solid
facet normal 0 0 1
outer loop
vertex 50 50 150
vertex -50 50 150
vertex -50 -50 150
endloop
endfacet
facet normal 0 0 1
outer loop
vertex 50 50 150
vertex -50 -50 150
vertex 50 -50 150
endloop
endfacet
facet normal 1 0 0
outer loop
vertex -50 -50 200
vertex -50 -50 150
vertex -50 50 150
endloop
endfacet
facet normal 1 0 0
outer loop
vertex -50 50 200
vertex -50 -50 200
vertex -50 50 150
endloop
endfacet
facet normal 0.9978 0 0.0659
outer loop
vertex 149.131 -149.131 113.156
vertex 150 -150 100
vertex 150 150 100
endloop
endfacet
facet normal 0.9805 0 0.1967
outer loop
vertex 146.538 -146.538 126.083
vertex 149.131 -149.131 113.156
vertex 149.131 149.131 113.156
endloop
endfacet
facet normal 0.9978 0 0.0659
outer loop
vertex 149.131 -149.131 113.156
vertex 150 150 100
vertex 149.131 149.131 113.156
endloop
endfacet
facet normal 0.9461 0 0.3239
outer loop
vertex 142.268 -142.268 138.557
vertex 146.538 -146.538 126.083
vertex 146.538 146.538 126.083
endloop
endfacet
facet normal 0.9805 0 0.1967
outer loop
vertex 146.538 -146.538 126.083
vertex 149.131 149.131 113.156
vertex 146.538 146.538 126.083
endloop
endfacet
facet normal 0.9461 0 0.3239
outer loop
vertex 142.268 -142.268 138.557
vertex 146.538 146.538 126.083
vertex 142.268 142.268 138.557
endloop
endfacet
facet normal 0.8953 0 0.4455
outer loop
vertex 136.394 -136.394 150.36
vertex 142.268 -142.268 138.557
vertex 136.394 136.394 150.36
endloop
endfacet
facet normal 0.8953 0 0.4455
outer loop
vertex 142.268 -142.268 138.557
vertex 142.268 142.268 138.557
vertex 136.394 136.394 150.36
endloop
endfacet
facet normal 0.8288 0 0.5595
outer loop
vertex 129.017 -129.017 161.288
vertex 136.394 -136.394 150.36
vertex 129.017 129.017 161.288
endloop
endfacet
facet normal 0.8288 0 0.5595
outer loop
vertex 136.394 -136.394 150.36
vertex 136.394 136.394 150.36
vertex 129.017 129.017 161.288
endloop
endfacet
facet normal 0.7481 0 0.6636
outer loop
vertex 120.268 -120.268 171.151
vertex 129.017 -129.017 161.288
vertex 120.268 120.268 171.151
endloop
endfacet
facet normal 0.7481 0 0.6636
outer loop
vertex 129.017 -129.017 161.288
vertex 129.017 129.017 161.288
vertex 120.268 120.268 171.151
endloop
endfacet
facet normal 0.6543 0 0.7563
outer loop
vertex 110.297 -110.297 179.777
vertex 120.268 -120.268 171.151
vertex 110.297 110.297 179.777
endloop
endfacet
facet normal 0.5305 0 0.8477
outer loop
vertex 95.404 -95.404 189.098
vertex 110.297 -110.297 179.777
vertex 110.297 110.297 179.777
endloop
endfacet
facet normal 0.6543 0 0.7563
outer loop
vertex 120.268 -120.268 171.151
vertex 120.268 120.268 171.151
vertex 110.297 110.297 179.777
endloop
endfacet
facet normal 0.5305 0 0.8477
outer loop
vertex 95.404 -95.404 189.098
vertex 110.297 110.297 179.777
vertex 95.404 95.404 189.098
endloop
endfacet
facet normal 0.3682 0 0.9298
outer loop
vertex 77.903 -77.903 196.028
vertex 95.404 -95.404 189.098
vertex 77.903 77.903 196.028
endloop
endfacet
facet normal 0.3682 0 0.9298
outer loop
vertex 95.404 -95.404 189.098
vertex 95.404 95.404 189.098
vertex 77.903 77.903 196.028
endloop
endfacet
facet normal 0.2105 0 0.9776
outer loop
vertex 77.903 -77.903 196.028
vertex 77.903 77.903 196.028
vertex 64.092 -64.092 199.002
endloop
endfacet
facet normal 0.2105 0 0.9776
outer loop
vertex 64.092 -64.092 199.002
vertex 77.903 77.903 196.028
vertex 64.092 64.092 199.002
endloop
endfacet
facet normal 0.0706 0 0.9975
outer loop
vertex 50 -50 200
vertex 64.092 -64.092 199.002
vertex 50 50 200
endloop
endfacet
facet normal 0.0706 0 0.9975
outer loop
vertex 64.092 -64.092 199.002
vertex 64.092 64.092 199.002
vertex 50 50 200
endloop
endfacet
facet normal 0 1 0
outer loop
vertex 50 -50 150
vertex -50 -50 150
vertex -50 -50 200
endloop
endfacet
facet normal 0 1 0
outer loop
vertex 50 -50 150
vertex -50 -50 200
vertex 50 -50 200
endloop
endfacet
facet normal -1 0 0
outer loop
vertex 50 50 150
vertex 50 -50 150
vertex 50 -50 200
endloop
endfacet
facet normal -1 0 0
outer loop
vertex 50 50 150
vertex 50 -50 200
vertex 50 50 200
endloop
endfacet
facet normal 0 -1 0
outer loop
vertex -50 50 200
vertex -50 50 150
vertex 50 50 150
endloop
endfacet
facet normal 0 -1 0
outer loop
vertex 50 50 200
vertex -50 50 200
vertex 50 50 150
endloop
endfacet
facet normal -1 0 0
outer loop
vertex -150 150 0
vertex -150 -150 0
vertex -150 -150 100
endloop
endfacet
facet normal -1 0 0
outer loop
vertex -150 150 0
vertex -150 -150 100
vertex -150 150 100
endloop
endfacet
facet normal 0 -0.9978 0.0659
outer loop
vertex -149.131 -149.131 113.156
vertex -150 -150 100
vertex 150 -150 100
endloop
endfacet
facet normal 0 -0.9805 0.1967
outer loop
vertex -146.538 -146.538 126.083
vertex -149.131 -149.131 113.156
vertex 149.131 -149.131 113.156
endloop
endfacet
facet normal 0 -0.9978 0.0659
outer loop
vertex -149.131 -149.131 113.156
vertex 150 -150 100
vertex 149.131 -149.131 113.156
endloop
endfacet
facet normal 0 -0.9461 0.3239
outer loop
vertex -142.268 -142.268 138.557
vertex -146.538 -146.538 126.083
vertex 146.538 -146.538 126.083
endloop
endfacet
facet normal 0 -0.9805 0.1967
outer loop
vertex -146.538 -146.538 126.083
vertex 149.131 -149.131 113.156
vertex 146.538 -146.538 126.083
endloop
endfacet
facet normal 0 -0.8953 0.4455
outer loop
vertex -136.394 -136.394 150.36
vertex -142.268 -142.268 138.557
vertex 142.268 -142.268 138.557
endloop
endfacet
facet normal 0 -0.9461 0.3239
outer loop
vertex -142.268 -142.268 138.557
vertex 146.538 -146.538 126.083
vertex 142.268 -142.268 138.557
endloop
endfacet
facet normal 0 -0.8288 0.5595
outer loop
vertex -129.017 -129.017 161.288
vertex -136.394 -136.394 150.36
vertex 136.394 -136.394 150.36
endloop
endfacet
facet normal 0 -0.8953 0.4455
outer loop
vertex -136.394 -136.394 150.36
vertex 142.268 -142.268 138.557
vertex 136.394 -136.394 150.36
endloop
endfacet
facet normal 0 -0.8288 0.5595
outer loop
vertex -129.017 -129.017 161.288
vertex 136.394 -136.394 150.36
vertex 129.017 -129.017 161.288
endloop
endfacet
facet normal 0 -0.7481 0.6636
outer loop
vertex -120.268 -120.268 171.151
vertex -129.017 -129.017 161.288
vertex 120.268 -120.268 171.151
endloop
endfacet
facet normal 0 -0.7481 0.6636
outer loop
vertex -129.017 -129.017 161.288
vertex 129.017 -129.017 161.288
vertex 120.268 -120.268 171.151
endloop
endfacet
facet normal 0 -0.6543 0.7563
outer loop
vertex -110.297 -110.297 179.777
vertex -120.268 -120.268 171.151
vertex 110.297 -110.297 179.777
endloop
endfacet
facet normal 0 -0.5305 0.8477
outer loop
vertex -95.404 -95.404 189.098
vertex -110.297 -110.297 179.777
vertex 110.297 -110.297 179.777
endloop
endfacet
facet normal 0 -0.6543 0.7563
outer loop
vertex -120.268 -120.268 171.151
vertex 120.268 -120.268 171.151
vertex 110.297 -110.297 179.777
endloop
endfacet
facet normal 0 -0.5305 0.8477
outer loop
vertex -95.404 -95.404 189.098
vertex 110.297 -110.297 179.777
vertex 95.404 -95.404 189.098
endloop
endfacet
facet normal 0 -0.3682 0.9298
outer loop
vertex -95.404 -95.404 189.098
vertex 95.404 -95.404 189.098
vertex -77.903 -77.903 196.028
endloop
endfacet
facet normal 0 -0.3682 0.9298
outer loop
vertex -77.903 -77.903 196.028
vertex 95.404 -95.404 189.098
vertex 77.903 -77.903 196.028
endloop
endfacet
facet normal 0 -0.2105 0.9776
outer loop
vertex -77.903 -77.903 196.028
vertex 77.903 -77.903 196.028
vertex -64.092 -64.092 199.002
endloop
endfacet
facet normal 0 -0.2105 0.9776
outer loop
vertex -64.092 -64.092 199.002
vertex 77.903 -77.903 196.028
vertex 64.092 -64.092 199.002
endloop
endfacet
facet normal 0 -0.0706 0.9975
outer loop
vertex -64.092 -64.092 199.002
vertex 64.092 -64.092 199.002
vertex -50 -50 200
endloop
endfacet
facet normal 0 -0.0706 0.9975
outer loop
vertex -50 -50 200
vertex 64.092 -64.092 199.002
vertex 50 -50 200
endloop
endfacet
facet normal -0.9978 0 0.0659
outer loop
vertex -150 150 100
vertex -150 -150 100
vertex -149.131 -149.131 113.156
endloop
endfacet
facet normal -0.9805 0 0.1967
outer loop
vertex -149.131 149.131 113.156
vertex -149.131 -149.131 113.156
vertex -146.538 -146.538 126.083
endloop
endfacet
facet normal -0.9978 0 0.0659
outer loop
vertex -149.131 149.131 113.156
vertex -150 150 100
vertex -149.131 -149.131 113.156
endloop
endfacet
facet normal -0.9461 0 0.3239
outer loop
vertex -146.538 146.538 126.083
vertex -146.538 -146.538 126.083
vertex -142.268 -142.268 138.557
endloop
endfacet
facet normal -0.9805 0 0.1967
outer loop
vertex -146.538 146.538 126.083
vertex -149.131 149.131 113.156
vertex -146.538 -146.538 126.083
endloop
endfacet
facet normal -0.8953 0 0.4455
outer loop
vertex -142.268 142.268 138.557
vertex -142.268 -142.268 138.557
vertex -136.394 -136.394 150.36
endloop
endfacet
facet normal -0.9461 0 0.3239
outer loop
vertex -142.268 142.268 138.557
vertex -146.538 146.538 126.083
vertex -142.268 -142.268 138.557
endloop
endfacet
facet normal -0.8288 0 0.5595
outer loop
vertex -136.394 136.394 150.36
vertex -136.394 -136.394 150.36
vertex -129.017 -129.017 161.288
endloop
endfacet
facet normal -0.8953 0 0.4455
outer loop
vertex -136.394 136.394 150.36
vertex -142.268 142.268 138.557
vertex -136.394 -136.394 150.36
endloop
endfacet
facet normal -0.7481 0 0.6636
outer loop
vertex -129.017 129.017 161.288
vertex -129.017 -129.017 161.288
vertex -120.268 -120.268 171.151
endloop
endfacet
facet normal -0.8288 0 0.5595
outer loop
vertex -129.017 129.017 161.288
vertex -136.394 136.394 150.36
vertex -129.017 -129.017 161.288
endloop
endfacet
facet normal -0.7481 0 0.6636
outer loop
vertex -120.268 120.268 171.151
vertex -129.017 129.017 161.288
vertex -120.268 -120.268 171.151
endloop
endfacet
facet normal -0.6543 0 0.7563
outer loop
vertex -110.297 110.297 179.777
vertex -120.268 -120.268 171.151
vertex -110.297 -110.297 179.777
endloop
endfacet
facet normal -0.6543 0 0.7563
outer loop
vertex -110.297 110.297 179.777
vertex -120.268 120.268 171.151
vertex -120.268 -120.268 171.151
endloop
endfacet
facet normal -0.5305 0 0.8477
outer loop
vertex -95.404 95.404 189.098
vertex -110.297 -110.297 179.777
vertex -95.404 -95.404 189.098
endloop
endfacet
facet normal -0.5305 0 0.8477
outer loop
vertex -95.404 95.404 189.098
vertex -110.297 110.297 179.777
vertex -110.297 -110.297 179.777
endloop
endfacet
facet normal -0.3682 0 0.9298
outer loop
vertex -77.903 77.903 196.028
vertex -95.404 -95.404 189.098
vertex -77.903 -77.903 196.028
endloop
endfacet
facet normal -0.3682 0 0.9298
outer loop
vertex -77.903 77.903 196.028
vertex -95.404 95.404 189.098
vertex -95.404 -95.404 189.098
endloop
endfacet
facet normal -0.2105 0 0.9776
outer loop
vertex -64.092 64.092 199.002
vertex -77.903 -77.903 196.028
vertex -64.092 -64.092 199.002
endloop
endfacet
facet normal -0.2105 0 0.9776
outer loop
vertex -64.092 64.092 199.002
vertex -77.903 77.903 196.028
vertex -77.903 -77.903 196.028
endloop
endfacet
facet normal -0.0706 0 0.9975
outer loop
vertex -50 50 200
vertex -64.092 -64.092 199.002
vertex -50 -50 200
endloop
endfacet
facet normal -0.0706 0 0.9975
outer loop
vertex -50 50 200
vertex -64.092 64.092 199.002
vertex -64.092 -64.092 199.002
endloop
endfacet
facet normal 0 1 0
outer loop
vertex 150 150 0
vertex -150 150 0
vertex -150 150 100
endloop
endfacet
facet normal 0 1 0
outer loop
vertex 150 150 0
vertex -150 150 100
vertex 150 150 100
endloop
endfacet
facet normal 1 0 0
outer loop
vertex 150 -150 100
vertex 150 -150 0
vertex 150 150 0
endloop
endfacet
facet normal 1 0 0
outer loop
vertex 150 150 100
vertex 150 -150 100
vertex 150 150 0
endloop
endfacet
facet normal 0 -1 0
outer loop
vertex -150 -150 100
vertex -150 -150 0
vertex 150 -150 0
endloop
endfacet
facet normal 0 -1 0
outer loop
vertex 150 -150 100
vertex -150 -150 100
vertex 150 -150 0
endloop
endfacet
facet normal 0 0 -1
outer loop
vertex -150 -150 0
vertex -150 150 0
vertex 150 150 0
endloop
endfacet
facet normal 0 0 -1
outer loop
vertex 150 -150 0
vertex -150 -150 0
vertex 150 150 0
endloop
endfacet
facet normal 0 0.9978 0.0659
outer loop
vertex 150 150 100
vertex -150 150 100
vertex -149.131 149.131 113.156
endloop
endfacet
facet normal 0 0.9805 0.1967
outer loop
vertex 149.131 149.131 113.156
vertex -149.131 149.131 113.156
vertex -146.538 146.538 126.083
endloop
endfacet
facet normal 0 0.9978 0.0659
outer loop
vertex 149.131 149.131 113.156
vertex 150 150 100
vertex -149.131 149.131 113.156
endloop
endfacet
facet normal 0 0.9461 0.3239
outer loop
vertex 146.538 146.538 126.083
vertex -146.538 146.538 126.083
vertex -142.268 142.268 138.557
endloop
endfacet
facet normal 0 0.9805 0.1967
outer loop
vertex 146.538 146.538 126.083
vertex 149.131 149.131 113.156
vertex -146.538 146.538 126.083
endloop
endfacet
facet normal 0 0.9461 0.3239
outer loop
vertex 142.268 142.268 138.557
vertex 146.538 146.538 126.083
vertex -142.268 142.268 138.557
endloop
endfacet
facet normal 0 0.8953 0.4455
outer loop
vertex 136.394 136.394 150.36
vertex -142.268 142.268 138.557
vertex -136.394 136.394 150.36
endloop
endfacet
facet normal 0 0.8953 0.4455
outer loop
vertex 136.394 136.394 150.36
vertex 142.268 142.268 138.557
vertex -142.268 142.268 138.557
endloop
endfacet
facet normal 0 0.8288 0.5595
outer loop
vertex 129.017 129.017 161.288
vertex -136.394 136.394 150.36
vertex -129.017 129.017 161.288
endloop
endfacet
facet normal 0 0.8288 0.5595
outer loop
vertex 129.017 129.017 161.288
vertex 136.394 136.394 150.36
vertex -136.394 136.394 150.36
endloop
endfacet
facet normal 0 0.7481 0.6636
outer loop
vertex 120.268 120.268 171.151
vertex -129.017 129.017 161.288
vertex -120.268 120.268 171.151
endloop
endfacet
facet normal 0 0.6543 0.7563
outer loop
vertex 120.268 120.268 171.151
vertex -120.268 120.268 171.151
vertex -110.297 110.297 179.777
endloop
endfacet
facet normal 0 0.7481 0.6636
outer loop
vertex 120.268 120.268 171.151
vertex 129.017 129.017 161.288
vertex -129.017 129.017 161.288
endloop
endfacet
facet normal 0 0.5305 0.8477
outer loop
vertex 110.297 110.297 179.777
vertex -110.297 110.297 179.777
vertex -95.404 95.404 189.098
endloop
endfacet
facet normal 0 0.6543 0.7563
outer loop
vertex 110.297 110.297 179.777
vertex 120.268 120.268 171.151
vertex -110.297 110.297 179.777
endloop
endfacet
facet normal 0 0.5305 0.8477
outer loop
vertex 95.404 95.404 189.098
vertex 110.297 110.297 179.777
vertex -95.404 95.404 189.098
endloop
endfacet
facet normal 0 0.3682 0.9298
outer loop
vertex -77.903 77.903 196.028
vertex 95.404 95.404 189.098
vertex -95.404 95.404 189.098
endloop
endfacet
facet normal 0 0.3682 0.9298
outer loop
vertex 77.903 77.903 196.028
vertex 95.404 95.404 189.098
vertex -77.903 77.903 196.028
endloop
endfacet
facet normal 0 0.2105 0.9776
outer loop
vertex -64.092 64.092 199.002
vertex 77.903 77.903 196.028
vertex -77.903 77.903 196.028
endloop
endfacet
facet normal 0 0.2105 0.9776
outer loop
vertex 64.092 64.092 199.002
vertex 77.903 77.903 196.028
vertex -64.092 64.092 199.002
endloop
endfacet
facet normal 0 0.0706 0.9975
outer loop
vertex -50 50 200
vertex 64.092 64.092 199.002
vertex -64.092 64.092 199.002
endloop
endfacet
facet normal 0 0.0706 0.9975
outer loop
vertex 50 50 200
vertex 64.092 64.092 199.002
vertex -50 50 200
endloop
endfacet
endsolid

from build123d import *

# Parameters (mm, degrees)
F0_W     = 300
F0_H     = 300
F0_W_2   = 100
F0_H_2   = 100
F1_DEPTH = 200
F2_DEPTH = 150
F3_R     = 99.99999


# Not quite as in the source:
# - a fillet or chamfer is up to 0.001 mm smaller than in the source, because OpenCascade refuses the exact size


with BuildPart() as f1:
    # F0 (on Top) → F1 (new body)
    with BuildSketch(Plane.XY):
        Rectangle(F0_W, F0_H)
        Rectangle(F0_W_2, F0_H_2, mode=Mode.SUBTRACT)
    extrude(amount=F1_DEPTH)

    # F0 (on Top) → F2 (join)
    with BuildSketch(Plane.XY):
        Rectangle(F0_W_2, F0_H_2)
    extrude(amount=F2_DEPTH)

    # F3 (radius 100 in the source; OpenCascade refuses exactly that, so slightly less here)
    f3_edges = [f1.edges().sort_by_distance(p)[0] for p in [
        (-150, 0, 200),
        (0, -150, 200),
        (150, 0, 200),
        (0, 150, 200),
    ]]
    fillet(f3_edges, radius=F3_R)


solid = f1.part
